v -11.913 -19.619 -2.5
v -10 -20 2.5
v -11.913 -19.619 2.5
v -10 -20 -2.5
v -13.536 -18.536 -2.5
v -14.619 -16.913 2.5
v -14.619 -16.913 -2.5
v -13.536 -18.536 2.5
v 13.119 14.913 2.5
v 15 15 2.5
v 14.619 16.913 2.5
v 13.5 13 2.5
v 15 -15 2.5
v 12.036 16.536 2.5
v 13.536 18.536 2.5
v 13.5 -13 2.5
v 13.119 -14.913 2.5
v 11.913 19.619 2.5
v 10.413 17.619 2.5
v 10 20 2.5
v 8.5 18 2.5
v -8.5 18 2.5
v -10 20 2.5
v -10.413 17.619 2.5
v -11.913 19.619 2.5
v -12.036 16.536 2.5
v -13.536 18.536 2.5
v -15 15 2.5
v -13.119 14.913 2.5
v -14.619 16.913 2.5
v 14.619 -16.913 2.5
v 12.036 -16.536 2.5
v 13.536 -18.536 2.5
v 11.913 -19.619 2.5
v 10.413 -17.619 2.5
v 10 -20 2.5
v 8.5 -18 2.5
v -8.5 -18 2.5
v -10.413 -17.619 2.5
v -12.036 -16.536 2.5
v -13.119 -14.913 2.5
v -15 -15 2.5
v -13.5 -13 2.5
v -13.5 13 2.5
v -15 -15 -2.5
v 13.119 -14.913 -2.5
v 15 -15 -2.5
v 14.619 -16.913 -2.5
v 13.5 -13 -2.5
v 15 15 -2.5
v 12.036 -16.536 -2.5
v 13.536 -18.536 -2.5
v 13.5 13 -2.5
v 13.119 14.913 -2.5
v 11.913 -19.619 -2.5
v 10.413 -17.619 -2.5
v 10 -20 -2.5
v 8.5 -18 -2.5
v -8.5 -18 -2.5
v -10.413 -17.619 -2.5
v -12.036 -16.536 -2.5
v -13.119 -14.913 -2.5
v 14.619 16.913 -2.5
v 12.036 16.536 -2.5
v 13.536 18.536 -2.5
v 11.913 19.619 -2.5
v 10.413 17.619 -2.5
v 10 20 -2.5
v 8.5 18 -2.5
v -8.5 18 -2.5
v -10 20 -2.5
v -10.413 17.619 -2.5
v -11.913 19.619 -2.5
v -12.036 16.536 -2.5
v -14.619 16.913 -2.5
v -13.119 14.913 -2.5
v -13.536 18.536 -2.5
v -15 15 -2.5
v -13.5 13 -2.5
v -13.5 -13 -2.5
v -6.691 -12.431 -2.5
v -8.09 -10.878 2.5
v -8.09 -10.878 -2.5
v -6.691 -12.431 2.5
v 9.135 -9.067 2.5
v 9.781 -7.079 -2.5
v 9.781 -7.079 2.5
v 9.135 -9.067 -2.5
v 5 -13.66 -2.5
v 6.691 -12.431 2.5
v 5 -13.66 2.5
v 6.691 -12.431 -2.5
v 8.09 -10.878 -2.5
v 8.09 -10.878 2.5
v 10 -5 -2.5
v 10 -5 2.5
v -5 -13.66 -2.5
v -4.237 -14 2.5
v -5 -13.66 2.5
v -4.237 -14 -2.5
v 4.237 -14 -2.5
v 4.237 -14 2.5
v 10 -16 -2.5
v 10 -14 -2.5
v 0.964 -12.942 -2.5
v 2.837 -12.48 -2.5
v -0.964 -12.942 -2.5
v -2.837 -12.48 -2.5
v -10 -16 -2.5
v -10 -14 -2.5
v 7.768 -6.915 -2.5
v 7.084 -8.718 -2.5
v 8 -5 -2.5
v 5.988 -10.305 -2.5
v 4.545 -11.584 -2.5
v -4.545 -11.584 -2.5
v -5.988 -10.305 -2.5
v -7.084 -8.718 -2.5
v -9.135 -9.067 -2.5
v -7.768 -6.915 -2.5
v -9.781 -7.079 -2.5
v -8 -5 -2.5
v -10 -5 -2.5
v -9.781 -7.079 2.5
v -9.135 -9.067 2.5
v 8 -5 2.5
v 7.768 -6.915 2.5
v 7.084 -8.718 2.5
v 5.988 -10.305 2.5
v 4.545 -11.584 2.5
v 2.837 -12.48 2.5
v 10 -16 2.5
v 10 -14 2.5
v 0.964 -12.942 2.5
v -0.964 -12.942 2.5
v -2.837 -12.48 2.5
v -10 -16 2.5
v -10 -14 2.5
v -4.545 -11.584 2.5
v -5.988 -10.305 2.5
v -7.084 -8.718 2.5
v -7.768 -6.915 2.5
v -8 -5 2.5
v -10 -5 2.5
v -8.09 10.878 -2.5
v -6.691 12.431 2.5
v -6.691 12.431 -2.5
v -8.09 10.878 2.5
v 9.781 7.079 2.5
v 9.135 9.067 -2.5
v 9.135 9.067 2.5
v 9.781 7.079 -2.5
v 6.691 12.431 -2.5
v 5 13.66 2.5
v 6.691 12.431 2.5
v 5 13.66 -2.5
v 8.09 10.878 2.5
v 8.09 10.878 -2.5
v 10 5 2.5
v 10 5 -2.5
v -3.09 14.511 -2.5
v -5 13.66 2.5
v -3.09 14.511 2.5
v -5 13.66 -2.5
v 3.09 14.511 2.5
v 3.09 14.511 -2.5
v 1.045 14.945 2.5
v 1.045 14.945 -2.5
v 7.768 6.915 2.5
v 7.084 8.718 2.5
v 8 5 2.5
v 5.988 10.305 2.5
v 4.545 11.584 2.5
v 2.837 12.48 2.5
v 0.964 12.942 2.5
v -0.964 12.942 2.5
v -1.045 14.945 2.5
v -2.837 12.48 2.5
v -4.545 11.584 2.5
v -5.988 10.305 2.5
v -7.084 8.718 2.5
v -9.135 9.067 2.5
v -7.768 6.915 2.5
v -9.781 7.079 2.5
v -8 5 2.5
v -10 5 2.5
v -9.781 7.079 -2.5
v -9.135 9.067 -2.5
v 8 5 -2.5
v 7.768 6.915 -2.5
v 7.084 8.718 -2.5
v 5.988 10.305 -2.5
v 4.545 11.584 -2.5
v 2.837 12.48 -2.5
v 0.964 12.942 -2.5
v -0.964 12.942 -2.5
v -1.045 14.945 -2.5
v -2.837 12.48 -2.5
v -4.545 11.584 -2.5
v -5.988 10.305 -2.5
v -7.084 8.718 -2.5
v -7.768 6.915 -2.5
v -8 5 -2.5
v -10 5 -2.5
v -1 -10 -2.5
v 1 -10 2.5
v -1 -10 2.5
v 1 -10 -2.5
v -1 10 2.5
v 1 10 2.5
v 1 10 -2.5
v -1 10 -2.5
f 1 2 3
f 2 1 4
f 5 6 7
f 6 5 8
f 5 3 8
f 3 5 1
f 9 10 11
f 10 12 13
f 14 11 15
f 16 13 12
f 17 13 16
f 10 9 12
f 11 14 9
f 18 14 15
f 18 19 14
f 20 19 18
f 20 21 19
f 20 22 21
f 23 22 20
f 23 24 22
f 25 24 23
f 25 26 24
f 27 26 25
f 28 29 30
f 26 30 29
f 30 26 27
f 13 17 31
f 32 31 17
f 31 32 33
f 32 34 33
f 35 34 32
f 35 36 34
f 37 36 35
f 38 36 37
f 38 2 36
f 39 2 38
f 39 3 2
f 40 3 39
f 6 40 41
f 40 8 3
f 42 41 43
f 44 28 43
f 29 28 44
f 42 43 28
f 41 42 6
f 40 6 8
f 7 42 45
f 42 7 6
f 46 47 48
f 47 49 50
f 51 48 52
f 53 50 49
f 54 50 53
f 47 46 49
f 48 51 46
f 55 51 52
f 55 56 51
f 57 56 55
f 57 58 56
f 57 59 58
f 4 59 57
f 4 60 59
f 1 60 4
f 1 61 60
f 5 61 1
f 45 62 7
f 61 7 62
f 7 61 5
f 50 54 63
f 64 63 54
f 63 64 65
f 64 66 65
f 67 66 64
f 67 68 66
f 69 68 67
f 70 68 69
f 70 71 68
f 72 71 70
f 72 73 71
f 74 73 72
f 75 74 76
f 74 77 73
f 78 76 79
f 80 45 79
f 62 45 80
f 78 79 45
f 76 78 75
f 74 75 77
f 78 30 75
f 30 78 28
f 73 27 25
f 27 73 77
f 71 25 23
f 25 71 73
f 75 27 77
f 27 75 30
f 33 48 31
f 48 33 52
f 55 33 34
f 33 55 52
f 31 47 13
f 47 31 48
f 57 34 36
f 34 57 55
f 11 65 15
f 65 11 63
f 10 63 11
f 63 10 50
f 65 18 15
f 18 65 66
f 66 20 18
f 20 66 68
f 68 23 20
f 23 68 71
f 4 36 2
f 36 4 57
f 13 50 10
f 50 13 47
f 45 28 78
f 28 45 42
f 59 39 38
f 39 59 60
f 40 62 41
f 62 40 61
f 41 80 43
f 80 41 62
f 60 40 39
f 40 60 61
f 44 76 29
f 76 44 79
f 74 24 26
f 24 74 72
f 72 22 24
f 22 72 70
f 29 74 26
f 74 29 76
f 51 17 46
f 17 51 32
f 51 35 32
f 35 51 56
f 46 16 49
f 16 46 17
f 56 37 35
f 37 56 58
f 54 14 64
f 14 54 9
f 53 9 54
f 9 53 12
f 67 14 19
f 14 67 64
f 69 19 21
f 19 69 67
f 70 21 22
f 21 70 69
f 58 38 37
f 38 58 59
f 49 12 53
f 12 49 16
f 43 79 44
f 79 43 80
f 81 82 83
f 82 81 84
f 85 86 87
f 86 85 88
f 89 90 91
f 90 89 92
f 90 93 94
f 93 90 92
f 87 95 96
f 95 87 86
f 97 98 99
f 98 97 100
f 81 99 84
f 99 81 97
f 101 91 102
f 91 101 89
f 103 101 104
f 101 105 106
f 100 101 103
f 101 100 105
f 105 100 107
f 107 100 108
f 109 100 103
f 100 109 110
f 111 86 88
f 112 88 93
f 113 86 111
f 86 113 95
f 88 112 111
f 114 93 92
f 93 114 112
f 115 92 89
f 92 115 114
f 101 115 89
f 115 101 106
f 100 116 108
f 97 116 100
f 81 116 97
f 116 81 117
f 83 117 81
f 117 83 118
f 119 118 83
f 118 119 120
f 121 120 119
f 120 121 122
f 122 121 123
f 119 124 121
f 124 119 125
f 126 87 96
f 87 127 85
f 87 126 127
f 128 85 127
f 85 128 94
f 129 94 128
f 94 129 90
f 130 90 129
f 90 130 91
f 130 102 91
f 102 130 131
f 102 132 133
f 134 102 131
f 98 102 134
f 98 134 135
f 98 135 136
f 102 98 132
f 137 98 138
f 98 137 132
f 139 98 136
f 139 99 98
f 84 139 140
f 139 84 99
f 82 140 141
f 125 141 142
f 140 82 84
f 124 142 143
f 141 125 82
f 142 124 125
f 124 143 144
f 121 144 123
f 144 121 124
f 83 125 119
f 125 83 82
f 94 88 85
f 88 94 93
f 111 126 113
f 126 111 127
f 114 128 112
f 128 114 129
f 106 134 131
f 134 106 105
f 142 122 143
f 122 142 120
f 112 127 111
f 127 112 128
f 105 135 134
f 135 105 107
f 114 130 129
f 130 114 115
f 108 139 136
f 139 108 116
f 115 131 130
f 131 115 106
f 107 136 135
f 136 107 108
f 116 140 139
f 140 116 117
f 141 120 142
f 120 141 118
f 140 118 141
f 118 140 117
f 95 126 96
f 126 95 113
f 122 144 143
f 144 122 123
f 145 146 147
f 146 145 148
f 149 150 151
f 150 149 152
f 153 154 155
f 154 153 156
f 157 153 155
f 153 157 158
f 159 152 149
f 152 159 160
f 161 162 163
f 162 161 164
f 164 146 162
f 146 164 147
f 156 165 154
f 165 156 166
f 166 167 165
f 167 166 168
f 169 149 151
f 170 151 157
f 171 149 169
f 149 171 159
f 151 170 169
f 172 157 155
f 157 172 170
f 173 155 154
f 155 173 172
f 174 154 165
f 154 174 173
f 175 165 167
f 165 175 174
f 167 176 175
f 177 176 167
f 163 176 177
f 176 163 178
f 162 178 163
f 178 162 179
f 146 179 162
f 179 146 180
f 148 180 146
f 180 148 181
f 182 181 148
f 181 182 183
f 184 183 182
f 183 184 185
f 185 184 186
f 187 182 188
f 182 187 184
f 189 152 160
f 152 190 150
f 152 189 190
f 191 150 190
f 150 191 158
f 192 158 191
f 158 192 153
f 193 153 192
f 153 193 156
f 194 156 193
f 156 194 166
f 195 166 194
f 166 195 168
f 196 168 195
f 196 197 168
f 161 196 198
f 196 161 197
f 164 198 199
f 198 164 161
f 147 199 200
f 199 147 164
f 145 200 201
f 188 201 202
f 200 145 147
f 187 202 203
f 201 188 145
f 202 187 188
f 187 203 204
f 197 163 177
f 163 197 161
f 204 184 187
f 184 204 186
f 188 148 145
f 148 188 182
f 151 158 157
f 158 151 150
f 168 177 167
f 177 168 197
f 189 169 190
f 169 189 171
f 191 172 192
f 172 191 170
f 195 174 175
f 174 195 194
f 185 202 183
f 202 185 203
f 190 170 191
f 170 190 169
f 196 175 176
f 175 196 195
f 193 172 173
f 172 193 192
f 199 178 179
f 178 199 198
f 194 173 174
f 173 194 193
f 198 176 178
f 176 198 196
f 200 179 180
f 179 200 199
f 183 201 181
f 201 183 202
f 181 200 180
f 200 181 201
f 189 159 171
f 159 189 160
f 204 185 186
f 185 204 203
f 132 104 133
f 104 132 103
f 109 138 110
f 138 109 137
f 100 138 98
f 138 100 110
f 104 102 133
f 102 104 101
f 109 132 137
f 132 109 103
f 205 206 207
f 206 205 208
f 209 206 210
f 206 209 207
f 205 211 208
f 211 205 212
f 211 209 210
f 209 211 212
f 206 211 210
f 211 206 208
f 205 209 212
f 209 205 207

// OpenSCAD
include <MCAD/boxes.scad>
//include <MCAD/involute_gears.scad>
include <MCAD/gears.scad>


module cylinderhole(outrad, inrad, hh, center=true) {
	difference() {
		cylinder(h=hh, r=outrad, center=center);
		cylinder(h=hh, r=inrad, center=center);
	}
}

module halfk(ww, dd, hh) {
	translate([0,0,-hh/2]) difference() {
		cylinderhole(ww,dd,hh, center=false);
		translate([-ww, 0, 0]) cube(size=[ww*2,ww*2,hh], center=false);
	}
}

module logo(ww, dd, hh) {

	union() {
		difference() {
			roundedBox([ww, dd, hh], hh, true);
			roundedBox([ww*0.9, dd*0.9, hh], hh, true);
		}

		translate([0,-5, 0]) rotate([  0,0,0]) halfk(10, 8, hh);
		translate([0, 5, 0]) rotate([180,0,0]) halfk(10, 8, hh);
		translate([0, -15, 0]) cube(size=[20,2,hh], center=true);

		rotate([0, 0, -90]) cube(size=[20,2,hh], center=true);
		//linear_extrude(height=hh, center=true) gear(number_of_teeth=12,circular_pitch=200);
	}
}

logo(30, 40, 5); 
